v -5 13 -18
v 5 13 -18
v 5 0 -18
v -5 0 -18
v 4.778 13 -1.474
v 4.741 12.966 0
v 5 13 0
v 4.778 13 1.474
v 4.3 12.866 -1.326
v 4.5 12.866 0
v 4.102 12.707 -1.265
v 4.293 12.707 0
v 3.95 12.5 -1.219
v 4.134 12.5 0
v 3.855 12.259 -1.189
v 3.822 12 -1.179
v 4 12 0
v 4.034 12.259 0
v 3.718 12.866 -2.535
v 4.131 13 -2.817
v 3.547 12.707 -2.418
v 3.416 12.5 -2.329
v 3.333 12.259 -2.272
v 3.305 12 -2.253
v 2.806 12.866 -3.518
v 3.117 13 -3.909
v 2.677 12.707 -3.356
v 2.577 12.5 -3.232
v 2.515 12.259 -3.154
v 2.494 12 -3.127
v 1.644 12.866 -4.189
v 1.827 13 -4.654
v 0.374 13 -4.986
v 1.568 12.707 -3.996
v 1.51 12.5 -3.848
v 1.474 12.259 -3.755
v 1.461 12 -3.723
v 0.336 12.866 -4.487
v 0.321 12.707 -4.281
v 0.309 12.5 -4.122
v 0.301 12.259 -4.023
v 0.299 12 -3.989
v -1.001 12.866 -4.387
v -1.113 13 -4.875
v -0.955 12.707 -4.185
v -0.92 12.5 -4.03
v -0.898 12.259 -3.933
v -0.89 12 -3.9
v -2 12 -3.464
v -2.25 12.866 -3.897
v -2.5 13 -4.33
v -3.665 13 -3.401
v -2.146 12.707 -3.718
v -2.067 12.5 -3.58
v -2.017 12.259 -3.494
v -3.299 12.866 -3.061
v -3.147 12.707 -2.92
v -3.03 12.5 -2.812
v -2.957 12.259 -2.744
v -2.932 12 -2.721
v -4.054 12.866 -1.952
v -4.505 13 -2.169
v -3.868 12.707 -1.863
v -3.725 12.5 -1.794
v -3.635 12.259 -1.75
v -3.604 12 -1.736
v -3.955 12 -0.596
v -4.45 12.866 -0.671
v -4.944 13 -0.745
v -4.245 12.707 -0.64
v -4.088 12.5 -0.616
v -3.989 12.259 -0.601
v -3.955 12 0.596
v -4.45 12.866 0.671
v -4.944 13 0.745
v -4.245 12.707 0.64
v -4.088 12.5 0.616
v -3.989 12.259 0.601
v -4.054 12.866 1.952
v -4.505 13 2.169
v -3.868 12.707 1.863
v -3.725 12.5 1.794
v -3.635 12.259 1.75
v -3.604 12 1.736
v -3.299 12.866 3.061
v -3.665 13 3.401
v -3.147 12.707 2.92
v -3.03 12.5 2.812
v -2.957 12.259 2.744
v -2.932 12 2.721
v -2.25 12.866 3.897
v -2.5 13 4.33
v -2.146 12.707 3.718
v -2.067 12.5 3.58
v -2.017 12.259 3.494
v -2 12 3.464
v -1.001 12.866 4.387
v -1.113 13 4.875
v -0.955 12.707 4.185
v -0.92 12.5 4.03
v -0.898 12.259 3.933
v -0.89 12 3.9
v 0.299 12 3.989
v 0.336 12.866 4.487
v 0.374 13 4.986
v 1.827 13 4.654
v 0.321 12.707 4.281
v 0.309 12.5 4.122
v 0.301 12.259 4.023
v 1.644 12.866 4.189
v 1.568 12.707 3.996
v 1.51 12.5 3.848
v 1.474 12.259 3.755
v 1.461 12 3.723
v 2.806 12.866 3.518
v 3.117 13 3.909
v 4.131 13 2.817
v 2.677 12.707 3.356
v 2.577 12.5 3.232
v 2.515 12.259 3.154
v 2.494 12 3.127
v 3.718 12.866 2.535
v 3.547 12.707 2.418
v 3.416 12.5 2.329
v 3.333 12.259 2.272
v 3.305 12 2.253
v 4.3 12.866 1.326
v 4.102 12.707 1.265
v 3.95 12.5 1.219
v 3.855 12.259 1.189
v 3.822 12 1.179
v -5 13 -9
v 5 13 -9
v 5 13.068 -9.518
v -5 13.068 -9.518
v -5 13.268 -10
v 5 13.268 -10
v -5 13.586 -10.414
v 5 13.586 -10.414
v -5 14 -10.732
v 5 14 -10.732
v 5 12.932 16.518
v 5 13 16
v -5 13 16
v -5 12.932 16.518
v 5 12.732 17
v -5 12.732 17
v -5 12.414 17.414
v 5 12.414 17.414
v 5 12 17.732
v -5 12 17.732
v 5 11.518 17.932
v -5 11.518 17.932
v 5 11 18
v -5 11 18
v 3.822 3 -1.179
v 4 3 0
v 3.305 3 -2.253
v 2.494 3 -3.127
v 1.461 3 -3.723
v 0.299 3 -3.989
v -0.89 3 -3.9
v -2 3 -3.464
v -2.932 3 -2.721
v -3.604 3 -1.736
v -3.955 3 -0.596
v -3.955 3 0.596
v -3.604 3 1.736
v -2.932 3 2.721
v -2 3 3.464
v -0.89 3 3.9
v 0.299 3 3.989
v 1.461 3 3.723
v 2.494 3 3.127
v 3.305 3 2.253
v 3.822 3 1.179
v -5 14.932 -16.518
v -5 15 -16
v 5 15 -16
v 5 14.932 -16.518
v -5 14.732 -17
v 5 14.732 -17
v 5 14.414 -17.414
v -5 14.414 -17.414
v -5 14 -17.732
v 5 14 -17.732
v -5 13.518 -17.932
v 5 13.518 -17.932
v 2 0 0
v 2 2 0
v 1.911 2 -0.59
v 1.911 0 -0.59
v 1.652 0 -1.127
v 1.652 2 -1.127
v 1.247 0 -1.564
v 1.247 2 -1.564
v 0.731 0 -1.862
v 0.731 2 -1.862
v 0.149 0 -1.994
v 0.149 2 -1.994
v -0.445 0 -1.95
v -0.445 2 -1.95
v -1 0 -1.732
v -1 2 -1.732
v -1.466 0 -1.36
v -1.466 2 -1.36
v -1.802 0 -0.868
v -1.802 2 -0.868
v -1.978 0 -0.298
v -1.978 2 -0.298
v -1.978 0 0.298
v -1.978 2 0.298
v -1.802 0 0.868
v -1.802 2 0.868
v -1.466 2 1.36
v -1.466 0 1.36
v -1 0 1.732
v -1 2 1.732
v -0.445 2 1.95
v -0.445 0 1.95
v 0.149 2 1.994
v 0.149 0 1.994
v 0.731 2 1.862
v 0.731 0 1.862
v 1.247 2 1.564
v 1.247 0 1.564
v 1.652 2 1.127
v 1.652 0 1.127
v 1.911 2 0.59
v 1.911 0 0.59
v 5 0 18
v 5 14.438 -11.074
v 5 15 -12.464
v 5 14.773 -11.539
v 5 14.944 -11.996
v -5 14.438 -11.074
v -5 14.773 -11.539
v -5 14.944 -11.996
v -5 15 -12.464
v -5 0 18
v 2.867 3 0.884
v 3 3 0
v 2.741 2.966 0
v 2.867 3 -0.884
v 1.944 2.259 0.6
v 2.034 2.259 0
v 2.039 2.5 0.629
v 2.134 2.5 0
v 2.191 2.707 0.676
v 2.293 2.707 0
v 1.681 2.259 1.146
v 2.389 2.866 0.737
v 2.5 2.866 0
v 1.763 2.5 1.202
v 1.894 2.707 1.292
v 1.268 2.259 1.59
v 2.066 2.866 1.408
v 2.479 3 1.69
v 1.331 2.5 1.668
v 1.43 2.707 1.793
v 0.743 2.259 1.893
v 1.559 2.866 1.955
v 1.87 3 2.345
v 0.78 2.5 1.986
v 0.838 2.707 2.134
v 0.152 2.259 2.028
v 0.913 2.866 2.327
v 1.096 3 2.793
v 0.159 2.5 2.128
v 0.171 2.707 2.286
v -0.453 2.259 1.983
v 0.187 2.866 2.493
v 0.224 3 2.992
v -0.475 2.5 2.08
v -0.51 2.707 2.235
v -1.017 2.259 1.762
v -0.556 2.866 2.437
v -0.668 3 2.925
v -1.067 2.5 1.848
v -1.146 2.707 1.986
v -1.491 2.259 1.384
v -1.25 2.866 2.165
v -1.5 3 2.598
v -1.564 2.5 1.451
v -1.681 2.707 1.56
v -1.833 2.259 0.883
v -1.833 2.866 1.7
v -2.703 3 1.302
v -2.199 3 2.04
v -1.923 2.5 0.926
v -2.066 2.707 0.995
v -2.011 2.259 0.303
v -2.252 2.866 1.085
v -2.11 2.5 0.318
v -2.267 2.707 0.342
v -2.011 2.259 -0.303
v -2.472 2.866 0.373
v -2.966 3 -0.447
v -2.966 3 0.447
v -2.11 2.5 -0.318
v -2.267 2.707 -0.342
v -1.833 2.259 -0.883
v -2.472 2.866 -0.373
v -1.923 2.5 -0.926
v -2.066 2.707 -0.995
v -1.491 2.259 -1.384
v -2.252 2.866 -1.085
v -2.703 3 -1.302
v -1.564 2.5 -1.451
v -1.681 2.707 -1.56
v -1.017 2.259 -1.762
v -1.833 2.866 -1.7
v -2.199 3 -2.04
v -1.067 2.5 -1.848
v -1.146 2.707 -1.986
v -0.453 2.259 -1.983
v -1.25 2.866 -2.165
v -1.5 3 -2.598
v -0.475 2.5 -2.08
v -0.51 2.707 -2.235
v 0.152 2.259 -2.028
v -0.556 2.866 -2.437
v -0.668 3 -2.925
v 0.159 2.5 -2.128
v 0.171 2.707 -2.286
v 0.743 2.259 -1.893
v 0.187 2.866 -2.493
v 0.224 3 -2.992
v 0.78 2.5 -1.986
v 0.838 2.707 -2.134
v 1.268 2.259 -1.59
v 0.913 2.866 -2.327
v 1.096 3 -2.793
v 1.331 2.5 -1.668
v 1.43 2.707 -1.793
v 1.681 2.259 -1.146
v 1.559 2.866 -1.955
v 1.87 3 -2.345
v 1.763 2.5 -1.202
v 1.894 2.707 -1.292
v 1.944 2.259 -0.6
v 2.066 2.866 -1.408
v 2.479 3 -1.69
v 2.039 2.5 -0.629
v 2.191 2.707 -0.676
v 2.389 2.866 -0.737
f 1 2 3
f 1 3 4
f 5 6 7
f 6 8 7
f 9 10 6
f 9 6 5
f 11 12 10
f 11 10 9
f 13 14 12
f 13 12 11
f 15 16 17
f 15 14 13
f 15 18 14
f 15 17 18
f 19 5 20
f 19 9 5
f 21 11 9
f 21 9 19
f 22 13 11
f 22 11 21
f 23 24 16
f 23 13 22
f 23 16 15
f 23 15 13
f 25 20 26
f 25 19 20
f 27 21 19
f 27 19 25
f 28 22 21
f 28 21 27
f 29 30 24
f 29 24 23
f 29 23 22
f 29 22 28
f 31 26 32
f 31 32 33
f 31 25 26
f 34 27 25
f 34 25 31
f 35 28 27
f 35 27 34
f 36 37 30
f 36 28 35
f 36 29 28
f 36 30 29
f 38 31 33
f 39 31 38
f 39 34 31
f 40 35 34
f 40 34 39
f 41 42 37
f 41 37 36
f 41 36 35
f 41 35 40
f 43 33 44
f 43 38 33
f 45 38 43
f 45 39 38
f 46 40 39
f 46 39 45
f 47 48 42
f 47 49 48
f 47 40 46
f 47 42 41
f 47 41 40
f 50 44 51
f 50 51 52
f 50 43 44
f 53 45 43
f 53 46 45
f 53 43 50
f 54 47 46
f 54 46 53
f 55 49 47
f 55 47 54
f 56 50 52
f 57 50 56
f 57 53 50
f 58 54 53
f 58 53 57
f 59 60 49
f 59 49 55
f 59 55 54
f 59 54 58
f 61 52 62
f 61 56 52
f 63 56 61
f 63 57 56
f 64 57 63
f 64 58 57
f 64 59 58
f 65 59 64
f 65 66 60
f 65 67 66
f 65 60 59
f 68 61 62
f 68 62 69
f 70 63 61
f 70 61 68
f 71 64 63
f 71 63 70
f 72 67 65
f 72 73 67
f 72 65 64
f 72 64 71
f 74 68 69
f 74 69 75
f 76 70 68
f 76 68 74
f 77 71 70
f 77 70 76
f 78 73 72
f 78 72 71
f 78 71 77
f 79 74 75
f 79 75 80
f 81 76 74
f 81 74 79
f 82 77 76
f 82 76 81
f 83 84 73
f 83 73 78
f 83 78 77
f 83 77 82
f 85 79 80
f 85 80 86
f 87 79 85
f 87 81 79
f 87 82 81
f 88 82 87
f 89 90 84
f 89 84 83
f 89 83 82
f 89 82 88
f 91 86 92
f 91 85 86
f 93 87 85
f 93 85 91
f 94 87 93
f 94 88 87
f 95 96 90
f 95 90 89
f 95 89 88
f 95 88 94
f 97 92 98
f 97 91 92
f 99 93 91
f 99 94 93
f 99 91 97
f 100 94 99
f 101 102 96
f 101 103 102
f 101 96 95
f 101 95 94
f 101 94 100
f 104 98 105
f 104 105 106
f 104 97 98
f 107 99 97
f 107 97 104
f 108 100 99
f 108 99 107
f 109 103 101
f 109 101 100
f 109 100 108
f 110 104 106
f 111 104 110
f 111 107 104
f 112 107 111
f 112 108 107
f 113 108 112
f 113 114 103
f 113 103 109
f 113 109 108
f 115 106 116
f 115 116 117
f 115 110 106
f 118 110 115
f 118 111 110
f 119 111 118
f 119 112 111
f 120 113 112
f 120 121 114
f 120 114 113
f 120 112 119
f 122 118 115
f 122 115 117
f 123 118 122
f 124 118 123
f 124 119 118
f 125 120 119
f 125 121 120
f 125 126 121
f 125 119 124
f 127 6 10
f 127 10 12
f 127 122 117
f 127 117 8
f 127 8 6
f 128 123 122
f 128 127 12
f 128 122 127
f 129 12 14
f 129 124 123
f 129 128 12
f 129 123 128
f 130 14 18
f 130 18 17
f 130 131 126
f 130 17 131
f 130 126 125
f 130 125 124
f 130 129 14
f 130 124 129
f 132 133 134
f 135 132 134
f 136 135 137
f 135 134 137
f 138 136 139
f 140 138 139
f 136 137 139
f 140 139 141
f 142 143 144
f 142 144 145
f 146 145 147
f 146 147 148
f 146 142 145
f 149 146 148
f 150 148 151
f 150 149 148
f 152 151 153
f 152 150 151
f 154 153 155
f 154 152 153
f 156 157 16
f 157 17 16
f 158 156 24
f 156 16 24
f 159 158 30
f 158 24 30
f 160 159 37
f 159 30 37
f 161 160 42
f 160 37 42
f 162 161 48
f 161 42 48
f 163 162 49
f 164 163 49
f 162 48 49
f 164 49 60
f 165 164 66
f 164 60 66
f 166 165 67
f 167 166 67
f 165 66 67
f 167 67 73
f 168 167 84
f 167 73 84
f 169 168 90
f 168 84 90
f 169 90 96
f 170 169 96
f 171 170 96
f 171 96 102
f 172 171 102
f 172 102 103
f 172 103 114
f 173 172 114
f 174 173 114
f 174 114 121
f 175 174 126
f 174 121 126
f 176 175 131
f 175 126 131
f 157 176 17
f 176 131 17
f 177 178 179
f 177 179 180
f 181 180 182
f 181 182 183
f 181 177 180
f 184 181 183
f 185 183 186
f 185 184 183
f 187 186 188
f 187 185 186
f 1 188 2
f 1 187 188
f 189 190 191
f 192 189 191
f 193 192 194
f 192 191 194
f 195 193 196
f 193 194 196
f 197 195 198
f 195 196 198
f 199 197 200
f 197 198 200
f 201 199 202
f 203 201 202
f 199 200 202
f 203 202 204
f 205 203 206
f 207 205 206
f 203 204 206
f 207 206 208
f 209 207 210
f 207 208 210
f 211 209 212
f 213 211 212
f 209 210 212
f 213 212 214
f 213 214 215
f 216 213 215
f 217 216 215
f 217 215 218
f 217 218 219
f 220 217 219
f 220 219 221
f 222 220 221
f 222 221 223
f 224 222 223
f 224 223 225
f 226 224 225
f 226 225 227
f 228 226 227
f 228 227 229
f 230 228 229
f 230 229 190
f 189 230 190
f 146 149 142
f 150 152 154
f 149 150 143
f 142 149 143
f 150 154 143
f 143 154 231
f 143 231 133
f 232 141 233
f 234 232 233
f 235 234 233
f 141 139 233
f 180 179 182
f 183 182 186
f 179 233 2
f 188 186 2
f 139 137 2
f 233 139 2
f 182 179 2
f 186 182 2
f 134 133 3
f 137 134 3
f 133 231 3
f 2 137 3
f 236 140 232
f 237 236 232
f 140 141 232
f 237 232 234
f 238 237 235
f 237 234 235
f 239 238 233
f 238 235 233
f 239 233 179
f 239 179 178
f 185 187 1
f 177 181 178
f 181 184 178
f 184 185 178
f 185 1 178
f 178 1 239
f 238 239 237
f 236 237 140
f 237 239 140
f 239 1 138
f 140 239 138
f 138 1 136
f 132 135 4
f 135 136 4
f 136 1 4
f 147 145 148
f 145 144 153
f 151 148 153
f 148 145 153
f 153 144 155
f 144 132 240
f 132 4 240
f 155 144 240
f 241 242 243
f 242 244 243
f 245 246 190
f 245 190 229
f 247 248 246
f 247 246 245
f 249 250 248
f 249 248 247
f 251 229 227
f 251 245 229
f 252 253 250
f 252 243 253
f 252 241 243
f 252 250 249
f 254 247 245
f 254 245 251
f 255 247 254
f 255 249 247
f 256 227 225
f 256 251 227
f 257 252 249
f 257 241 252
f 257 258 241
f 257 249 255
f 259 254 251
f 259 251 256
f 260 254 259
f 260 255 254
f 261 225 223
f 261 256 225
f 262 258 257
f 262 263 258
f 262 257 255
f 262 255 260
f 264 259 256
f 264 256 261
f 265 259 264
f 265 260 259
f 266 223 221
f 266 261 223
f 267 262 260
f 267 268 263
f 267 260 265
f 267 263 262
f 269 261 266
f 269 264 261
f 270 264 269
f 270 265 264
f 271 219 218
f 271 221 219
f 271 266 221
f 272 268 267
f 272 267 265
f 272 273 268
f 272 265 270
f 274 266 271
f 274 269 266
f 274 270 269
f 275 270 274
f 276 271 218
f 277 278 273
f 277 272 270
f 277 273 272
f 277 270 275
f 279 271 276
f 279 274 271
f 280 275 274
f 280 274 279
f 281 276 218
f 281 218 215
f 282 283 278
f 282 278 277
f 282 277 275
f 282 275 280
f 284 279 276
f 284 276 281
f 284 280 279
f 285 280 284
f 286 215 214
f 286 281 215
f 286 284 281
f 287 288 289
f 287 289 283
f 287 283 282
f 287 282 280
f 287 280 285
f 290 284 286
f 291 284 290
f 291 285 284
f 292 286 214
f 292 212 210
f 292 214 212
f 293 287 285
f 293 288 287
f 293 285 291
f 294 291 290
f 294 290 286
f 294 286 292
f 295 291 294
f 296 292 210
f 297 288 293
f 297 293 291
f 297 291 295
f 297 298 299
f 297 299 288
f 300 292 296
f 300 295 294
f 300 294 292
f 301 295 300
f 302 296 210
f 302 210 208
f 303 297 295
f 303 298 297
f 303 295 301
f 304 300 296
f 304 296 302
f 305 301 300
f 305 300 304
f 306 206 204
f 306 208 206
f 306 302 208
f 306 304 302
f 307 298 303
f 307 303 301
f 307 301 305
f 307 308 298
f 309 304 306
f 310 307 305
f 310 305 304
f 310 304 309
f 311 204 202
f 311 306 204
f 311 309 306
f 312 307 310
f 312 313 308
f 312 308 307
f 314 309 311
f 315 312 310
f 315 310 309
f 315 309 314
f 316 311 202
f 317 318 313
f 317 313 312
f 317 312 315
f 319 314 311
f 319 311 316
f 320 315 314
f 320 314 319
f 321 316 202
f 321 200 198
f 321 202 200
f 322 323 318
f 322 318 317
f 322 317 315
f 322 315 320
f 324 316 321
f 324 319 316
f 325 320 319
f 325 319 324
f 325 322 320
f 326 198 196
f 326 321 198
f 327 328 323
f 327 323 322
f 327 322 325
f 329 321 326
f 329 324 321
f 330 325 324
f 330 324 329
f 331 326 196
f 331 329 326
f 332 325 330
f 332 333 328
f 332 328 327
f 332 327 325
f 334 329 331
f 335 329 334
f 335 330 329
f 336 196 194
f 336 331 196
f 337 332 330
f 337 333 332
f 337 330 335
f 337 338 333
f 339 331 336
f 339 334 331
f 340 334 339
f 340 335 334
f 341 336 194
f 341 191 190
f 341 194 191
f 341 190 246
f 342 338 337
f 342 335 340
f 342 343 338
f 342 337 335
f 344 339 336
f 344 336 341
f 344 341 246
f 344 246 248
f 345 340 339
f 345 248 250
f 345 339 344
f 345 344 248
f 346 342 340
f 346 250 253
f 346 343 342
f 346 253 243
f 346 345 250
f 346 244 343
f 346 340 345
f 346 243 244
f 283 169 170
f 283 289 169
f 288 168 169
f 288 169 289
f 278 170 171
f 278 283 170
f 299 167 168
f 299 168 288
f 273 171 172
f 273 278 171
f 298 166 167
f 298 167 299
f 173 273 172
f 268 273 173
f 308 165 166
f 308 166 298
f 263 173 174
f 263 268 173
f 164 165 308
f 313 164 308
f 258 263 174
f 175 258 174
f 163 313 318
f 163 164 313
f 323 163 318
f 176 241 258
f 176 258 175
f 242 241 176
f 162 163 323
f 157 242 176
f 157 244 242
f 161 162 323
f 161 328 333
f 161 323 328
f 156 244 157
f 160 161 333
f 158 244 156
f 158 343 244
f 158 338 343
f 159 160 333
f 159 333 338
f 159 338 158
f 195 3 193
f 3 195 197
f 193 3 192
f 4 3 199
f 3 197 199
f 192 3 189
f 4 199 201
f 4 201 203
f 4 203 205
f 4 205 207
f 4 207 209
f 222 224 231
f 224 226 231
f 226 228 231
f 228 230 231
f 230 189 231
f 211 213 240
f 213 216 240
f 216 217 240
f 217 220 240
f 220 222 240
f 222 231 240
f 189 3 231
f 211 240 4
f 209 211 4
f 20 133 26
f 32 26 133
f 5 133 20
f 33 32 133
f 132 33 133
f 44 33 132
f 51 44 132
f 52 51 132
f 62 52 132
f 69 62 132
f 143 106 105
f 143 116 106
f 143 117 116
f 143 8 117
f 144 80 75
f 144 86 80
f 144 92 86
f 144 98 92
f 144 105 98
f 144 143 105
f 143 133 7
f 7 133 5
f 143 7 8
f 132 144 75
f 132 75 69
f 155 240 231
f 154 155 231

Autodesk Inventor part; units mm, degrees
ref_plane "YZ Plane" through (0, 0, 0) normal (1, 0, 0) x (0, 1, 0)
ref_plane "XZ Plane" through (0, 0, 0) normal (0, 1, 0) x (-1, 0, 0)
ref_plane "XY Plane" through (0, 0, 0) normal (0, 0, 1) x (1, 0, 0)
sketch "Sketch1" plane through (0, 0, 0) normal (0, 1, 0) x (-1, 0, 0)
  line L0 (5, 18) -> (-5, 18)
  line L1 (-5, 18) -> (-5, -18)
  line L2 (-5, -18) -> (5, -18)
  line L3 (5, -18) -> (5, 18)
  line L4 (5, 18) -> (-5, -18) construction
  line L5 (-5, 18) -> (5, -18) construction
  line L6 (5, -18) -> (5, -11)
  line L7 (5, -11) -> (-5, -11)
  point P0 (0, 0)
  dimension "d0" = 10
  dimension "d1" = 36
  dimension "d2" = 7
extrude "Extrusion1" add sketch "Sketch1" along normal blind 13 contours L3 L7 L1 L0
extrude "Extrusion2" add sketch "Sketch1" along normal blind 15 contours L3 L2 L1 L7
fillet "Fillet1" radius 2 4 edges at (0, 15, -11) (0, 13, -11) (0, 15, -18) (0, 13, 18)
sketch "Sketch2" plane through (0, 13, 0) normal (0, 1, 0) x (1, 0, 0)
  circle A0 centre (0, 0) radius 4
  circle A1 centre (0, 0) radius 2
  dimension "d8" = 8
  dimension "d9" = 4
extrude "Extrusion3" cut sketch "Sketch2" against normal blind 15 contours A1
extrude "Extrusion4" cut sketch "Sketch2" against normal blind 10
fillet "Fillet2" radius 1 2 edges at (-2, 3, 0) (-4, 13, 0)
properties part number "offset_vacuumbox"
